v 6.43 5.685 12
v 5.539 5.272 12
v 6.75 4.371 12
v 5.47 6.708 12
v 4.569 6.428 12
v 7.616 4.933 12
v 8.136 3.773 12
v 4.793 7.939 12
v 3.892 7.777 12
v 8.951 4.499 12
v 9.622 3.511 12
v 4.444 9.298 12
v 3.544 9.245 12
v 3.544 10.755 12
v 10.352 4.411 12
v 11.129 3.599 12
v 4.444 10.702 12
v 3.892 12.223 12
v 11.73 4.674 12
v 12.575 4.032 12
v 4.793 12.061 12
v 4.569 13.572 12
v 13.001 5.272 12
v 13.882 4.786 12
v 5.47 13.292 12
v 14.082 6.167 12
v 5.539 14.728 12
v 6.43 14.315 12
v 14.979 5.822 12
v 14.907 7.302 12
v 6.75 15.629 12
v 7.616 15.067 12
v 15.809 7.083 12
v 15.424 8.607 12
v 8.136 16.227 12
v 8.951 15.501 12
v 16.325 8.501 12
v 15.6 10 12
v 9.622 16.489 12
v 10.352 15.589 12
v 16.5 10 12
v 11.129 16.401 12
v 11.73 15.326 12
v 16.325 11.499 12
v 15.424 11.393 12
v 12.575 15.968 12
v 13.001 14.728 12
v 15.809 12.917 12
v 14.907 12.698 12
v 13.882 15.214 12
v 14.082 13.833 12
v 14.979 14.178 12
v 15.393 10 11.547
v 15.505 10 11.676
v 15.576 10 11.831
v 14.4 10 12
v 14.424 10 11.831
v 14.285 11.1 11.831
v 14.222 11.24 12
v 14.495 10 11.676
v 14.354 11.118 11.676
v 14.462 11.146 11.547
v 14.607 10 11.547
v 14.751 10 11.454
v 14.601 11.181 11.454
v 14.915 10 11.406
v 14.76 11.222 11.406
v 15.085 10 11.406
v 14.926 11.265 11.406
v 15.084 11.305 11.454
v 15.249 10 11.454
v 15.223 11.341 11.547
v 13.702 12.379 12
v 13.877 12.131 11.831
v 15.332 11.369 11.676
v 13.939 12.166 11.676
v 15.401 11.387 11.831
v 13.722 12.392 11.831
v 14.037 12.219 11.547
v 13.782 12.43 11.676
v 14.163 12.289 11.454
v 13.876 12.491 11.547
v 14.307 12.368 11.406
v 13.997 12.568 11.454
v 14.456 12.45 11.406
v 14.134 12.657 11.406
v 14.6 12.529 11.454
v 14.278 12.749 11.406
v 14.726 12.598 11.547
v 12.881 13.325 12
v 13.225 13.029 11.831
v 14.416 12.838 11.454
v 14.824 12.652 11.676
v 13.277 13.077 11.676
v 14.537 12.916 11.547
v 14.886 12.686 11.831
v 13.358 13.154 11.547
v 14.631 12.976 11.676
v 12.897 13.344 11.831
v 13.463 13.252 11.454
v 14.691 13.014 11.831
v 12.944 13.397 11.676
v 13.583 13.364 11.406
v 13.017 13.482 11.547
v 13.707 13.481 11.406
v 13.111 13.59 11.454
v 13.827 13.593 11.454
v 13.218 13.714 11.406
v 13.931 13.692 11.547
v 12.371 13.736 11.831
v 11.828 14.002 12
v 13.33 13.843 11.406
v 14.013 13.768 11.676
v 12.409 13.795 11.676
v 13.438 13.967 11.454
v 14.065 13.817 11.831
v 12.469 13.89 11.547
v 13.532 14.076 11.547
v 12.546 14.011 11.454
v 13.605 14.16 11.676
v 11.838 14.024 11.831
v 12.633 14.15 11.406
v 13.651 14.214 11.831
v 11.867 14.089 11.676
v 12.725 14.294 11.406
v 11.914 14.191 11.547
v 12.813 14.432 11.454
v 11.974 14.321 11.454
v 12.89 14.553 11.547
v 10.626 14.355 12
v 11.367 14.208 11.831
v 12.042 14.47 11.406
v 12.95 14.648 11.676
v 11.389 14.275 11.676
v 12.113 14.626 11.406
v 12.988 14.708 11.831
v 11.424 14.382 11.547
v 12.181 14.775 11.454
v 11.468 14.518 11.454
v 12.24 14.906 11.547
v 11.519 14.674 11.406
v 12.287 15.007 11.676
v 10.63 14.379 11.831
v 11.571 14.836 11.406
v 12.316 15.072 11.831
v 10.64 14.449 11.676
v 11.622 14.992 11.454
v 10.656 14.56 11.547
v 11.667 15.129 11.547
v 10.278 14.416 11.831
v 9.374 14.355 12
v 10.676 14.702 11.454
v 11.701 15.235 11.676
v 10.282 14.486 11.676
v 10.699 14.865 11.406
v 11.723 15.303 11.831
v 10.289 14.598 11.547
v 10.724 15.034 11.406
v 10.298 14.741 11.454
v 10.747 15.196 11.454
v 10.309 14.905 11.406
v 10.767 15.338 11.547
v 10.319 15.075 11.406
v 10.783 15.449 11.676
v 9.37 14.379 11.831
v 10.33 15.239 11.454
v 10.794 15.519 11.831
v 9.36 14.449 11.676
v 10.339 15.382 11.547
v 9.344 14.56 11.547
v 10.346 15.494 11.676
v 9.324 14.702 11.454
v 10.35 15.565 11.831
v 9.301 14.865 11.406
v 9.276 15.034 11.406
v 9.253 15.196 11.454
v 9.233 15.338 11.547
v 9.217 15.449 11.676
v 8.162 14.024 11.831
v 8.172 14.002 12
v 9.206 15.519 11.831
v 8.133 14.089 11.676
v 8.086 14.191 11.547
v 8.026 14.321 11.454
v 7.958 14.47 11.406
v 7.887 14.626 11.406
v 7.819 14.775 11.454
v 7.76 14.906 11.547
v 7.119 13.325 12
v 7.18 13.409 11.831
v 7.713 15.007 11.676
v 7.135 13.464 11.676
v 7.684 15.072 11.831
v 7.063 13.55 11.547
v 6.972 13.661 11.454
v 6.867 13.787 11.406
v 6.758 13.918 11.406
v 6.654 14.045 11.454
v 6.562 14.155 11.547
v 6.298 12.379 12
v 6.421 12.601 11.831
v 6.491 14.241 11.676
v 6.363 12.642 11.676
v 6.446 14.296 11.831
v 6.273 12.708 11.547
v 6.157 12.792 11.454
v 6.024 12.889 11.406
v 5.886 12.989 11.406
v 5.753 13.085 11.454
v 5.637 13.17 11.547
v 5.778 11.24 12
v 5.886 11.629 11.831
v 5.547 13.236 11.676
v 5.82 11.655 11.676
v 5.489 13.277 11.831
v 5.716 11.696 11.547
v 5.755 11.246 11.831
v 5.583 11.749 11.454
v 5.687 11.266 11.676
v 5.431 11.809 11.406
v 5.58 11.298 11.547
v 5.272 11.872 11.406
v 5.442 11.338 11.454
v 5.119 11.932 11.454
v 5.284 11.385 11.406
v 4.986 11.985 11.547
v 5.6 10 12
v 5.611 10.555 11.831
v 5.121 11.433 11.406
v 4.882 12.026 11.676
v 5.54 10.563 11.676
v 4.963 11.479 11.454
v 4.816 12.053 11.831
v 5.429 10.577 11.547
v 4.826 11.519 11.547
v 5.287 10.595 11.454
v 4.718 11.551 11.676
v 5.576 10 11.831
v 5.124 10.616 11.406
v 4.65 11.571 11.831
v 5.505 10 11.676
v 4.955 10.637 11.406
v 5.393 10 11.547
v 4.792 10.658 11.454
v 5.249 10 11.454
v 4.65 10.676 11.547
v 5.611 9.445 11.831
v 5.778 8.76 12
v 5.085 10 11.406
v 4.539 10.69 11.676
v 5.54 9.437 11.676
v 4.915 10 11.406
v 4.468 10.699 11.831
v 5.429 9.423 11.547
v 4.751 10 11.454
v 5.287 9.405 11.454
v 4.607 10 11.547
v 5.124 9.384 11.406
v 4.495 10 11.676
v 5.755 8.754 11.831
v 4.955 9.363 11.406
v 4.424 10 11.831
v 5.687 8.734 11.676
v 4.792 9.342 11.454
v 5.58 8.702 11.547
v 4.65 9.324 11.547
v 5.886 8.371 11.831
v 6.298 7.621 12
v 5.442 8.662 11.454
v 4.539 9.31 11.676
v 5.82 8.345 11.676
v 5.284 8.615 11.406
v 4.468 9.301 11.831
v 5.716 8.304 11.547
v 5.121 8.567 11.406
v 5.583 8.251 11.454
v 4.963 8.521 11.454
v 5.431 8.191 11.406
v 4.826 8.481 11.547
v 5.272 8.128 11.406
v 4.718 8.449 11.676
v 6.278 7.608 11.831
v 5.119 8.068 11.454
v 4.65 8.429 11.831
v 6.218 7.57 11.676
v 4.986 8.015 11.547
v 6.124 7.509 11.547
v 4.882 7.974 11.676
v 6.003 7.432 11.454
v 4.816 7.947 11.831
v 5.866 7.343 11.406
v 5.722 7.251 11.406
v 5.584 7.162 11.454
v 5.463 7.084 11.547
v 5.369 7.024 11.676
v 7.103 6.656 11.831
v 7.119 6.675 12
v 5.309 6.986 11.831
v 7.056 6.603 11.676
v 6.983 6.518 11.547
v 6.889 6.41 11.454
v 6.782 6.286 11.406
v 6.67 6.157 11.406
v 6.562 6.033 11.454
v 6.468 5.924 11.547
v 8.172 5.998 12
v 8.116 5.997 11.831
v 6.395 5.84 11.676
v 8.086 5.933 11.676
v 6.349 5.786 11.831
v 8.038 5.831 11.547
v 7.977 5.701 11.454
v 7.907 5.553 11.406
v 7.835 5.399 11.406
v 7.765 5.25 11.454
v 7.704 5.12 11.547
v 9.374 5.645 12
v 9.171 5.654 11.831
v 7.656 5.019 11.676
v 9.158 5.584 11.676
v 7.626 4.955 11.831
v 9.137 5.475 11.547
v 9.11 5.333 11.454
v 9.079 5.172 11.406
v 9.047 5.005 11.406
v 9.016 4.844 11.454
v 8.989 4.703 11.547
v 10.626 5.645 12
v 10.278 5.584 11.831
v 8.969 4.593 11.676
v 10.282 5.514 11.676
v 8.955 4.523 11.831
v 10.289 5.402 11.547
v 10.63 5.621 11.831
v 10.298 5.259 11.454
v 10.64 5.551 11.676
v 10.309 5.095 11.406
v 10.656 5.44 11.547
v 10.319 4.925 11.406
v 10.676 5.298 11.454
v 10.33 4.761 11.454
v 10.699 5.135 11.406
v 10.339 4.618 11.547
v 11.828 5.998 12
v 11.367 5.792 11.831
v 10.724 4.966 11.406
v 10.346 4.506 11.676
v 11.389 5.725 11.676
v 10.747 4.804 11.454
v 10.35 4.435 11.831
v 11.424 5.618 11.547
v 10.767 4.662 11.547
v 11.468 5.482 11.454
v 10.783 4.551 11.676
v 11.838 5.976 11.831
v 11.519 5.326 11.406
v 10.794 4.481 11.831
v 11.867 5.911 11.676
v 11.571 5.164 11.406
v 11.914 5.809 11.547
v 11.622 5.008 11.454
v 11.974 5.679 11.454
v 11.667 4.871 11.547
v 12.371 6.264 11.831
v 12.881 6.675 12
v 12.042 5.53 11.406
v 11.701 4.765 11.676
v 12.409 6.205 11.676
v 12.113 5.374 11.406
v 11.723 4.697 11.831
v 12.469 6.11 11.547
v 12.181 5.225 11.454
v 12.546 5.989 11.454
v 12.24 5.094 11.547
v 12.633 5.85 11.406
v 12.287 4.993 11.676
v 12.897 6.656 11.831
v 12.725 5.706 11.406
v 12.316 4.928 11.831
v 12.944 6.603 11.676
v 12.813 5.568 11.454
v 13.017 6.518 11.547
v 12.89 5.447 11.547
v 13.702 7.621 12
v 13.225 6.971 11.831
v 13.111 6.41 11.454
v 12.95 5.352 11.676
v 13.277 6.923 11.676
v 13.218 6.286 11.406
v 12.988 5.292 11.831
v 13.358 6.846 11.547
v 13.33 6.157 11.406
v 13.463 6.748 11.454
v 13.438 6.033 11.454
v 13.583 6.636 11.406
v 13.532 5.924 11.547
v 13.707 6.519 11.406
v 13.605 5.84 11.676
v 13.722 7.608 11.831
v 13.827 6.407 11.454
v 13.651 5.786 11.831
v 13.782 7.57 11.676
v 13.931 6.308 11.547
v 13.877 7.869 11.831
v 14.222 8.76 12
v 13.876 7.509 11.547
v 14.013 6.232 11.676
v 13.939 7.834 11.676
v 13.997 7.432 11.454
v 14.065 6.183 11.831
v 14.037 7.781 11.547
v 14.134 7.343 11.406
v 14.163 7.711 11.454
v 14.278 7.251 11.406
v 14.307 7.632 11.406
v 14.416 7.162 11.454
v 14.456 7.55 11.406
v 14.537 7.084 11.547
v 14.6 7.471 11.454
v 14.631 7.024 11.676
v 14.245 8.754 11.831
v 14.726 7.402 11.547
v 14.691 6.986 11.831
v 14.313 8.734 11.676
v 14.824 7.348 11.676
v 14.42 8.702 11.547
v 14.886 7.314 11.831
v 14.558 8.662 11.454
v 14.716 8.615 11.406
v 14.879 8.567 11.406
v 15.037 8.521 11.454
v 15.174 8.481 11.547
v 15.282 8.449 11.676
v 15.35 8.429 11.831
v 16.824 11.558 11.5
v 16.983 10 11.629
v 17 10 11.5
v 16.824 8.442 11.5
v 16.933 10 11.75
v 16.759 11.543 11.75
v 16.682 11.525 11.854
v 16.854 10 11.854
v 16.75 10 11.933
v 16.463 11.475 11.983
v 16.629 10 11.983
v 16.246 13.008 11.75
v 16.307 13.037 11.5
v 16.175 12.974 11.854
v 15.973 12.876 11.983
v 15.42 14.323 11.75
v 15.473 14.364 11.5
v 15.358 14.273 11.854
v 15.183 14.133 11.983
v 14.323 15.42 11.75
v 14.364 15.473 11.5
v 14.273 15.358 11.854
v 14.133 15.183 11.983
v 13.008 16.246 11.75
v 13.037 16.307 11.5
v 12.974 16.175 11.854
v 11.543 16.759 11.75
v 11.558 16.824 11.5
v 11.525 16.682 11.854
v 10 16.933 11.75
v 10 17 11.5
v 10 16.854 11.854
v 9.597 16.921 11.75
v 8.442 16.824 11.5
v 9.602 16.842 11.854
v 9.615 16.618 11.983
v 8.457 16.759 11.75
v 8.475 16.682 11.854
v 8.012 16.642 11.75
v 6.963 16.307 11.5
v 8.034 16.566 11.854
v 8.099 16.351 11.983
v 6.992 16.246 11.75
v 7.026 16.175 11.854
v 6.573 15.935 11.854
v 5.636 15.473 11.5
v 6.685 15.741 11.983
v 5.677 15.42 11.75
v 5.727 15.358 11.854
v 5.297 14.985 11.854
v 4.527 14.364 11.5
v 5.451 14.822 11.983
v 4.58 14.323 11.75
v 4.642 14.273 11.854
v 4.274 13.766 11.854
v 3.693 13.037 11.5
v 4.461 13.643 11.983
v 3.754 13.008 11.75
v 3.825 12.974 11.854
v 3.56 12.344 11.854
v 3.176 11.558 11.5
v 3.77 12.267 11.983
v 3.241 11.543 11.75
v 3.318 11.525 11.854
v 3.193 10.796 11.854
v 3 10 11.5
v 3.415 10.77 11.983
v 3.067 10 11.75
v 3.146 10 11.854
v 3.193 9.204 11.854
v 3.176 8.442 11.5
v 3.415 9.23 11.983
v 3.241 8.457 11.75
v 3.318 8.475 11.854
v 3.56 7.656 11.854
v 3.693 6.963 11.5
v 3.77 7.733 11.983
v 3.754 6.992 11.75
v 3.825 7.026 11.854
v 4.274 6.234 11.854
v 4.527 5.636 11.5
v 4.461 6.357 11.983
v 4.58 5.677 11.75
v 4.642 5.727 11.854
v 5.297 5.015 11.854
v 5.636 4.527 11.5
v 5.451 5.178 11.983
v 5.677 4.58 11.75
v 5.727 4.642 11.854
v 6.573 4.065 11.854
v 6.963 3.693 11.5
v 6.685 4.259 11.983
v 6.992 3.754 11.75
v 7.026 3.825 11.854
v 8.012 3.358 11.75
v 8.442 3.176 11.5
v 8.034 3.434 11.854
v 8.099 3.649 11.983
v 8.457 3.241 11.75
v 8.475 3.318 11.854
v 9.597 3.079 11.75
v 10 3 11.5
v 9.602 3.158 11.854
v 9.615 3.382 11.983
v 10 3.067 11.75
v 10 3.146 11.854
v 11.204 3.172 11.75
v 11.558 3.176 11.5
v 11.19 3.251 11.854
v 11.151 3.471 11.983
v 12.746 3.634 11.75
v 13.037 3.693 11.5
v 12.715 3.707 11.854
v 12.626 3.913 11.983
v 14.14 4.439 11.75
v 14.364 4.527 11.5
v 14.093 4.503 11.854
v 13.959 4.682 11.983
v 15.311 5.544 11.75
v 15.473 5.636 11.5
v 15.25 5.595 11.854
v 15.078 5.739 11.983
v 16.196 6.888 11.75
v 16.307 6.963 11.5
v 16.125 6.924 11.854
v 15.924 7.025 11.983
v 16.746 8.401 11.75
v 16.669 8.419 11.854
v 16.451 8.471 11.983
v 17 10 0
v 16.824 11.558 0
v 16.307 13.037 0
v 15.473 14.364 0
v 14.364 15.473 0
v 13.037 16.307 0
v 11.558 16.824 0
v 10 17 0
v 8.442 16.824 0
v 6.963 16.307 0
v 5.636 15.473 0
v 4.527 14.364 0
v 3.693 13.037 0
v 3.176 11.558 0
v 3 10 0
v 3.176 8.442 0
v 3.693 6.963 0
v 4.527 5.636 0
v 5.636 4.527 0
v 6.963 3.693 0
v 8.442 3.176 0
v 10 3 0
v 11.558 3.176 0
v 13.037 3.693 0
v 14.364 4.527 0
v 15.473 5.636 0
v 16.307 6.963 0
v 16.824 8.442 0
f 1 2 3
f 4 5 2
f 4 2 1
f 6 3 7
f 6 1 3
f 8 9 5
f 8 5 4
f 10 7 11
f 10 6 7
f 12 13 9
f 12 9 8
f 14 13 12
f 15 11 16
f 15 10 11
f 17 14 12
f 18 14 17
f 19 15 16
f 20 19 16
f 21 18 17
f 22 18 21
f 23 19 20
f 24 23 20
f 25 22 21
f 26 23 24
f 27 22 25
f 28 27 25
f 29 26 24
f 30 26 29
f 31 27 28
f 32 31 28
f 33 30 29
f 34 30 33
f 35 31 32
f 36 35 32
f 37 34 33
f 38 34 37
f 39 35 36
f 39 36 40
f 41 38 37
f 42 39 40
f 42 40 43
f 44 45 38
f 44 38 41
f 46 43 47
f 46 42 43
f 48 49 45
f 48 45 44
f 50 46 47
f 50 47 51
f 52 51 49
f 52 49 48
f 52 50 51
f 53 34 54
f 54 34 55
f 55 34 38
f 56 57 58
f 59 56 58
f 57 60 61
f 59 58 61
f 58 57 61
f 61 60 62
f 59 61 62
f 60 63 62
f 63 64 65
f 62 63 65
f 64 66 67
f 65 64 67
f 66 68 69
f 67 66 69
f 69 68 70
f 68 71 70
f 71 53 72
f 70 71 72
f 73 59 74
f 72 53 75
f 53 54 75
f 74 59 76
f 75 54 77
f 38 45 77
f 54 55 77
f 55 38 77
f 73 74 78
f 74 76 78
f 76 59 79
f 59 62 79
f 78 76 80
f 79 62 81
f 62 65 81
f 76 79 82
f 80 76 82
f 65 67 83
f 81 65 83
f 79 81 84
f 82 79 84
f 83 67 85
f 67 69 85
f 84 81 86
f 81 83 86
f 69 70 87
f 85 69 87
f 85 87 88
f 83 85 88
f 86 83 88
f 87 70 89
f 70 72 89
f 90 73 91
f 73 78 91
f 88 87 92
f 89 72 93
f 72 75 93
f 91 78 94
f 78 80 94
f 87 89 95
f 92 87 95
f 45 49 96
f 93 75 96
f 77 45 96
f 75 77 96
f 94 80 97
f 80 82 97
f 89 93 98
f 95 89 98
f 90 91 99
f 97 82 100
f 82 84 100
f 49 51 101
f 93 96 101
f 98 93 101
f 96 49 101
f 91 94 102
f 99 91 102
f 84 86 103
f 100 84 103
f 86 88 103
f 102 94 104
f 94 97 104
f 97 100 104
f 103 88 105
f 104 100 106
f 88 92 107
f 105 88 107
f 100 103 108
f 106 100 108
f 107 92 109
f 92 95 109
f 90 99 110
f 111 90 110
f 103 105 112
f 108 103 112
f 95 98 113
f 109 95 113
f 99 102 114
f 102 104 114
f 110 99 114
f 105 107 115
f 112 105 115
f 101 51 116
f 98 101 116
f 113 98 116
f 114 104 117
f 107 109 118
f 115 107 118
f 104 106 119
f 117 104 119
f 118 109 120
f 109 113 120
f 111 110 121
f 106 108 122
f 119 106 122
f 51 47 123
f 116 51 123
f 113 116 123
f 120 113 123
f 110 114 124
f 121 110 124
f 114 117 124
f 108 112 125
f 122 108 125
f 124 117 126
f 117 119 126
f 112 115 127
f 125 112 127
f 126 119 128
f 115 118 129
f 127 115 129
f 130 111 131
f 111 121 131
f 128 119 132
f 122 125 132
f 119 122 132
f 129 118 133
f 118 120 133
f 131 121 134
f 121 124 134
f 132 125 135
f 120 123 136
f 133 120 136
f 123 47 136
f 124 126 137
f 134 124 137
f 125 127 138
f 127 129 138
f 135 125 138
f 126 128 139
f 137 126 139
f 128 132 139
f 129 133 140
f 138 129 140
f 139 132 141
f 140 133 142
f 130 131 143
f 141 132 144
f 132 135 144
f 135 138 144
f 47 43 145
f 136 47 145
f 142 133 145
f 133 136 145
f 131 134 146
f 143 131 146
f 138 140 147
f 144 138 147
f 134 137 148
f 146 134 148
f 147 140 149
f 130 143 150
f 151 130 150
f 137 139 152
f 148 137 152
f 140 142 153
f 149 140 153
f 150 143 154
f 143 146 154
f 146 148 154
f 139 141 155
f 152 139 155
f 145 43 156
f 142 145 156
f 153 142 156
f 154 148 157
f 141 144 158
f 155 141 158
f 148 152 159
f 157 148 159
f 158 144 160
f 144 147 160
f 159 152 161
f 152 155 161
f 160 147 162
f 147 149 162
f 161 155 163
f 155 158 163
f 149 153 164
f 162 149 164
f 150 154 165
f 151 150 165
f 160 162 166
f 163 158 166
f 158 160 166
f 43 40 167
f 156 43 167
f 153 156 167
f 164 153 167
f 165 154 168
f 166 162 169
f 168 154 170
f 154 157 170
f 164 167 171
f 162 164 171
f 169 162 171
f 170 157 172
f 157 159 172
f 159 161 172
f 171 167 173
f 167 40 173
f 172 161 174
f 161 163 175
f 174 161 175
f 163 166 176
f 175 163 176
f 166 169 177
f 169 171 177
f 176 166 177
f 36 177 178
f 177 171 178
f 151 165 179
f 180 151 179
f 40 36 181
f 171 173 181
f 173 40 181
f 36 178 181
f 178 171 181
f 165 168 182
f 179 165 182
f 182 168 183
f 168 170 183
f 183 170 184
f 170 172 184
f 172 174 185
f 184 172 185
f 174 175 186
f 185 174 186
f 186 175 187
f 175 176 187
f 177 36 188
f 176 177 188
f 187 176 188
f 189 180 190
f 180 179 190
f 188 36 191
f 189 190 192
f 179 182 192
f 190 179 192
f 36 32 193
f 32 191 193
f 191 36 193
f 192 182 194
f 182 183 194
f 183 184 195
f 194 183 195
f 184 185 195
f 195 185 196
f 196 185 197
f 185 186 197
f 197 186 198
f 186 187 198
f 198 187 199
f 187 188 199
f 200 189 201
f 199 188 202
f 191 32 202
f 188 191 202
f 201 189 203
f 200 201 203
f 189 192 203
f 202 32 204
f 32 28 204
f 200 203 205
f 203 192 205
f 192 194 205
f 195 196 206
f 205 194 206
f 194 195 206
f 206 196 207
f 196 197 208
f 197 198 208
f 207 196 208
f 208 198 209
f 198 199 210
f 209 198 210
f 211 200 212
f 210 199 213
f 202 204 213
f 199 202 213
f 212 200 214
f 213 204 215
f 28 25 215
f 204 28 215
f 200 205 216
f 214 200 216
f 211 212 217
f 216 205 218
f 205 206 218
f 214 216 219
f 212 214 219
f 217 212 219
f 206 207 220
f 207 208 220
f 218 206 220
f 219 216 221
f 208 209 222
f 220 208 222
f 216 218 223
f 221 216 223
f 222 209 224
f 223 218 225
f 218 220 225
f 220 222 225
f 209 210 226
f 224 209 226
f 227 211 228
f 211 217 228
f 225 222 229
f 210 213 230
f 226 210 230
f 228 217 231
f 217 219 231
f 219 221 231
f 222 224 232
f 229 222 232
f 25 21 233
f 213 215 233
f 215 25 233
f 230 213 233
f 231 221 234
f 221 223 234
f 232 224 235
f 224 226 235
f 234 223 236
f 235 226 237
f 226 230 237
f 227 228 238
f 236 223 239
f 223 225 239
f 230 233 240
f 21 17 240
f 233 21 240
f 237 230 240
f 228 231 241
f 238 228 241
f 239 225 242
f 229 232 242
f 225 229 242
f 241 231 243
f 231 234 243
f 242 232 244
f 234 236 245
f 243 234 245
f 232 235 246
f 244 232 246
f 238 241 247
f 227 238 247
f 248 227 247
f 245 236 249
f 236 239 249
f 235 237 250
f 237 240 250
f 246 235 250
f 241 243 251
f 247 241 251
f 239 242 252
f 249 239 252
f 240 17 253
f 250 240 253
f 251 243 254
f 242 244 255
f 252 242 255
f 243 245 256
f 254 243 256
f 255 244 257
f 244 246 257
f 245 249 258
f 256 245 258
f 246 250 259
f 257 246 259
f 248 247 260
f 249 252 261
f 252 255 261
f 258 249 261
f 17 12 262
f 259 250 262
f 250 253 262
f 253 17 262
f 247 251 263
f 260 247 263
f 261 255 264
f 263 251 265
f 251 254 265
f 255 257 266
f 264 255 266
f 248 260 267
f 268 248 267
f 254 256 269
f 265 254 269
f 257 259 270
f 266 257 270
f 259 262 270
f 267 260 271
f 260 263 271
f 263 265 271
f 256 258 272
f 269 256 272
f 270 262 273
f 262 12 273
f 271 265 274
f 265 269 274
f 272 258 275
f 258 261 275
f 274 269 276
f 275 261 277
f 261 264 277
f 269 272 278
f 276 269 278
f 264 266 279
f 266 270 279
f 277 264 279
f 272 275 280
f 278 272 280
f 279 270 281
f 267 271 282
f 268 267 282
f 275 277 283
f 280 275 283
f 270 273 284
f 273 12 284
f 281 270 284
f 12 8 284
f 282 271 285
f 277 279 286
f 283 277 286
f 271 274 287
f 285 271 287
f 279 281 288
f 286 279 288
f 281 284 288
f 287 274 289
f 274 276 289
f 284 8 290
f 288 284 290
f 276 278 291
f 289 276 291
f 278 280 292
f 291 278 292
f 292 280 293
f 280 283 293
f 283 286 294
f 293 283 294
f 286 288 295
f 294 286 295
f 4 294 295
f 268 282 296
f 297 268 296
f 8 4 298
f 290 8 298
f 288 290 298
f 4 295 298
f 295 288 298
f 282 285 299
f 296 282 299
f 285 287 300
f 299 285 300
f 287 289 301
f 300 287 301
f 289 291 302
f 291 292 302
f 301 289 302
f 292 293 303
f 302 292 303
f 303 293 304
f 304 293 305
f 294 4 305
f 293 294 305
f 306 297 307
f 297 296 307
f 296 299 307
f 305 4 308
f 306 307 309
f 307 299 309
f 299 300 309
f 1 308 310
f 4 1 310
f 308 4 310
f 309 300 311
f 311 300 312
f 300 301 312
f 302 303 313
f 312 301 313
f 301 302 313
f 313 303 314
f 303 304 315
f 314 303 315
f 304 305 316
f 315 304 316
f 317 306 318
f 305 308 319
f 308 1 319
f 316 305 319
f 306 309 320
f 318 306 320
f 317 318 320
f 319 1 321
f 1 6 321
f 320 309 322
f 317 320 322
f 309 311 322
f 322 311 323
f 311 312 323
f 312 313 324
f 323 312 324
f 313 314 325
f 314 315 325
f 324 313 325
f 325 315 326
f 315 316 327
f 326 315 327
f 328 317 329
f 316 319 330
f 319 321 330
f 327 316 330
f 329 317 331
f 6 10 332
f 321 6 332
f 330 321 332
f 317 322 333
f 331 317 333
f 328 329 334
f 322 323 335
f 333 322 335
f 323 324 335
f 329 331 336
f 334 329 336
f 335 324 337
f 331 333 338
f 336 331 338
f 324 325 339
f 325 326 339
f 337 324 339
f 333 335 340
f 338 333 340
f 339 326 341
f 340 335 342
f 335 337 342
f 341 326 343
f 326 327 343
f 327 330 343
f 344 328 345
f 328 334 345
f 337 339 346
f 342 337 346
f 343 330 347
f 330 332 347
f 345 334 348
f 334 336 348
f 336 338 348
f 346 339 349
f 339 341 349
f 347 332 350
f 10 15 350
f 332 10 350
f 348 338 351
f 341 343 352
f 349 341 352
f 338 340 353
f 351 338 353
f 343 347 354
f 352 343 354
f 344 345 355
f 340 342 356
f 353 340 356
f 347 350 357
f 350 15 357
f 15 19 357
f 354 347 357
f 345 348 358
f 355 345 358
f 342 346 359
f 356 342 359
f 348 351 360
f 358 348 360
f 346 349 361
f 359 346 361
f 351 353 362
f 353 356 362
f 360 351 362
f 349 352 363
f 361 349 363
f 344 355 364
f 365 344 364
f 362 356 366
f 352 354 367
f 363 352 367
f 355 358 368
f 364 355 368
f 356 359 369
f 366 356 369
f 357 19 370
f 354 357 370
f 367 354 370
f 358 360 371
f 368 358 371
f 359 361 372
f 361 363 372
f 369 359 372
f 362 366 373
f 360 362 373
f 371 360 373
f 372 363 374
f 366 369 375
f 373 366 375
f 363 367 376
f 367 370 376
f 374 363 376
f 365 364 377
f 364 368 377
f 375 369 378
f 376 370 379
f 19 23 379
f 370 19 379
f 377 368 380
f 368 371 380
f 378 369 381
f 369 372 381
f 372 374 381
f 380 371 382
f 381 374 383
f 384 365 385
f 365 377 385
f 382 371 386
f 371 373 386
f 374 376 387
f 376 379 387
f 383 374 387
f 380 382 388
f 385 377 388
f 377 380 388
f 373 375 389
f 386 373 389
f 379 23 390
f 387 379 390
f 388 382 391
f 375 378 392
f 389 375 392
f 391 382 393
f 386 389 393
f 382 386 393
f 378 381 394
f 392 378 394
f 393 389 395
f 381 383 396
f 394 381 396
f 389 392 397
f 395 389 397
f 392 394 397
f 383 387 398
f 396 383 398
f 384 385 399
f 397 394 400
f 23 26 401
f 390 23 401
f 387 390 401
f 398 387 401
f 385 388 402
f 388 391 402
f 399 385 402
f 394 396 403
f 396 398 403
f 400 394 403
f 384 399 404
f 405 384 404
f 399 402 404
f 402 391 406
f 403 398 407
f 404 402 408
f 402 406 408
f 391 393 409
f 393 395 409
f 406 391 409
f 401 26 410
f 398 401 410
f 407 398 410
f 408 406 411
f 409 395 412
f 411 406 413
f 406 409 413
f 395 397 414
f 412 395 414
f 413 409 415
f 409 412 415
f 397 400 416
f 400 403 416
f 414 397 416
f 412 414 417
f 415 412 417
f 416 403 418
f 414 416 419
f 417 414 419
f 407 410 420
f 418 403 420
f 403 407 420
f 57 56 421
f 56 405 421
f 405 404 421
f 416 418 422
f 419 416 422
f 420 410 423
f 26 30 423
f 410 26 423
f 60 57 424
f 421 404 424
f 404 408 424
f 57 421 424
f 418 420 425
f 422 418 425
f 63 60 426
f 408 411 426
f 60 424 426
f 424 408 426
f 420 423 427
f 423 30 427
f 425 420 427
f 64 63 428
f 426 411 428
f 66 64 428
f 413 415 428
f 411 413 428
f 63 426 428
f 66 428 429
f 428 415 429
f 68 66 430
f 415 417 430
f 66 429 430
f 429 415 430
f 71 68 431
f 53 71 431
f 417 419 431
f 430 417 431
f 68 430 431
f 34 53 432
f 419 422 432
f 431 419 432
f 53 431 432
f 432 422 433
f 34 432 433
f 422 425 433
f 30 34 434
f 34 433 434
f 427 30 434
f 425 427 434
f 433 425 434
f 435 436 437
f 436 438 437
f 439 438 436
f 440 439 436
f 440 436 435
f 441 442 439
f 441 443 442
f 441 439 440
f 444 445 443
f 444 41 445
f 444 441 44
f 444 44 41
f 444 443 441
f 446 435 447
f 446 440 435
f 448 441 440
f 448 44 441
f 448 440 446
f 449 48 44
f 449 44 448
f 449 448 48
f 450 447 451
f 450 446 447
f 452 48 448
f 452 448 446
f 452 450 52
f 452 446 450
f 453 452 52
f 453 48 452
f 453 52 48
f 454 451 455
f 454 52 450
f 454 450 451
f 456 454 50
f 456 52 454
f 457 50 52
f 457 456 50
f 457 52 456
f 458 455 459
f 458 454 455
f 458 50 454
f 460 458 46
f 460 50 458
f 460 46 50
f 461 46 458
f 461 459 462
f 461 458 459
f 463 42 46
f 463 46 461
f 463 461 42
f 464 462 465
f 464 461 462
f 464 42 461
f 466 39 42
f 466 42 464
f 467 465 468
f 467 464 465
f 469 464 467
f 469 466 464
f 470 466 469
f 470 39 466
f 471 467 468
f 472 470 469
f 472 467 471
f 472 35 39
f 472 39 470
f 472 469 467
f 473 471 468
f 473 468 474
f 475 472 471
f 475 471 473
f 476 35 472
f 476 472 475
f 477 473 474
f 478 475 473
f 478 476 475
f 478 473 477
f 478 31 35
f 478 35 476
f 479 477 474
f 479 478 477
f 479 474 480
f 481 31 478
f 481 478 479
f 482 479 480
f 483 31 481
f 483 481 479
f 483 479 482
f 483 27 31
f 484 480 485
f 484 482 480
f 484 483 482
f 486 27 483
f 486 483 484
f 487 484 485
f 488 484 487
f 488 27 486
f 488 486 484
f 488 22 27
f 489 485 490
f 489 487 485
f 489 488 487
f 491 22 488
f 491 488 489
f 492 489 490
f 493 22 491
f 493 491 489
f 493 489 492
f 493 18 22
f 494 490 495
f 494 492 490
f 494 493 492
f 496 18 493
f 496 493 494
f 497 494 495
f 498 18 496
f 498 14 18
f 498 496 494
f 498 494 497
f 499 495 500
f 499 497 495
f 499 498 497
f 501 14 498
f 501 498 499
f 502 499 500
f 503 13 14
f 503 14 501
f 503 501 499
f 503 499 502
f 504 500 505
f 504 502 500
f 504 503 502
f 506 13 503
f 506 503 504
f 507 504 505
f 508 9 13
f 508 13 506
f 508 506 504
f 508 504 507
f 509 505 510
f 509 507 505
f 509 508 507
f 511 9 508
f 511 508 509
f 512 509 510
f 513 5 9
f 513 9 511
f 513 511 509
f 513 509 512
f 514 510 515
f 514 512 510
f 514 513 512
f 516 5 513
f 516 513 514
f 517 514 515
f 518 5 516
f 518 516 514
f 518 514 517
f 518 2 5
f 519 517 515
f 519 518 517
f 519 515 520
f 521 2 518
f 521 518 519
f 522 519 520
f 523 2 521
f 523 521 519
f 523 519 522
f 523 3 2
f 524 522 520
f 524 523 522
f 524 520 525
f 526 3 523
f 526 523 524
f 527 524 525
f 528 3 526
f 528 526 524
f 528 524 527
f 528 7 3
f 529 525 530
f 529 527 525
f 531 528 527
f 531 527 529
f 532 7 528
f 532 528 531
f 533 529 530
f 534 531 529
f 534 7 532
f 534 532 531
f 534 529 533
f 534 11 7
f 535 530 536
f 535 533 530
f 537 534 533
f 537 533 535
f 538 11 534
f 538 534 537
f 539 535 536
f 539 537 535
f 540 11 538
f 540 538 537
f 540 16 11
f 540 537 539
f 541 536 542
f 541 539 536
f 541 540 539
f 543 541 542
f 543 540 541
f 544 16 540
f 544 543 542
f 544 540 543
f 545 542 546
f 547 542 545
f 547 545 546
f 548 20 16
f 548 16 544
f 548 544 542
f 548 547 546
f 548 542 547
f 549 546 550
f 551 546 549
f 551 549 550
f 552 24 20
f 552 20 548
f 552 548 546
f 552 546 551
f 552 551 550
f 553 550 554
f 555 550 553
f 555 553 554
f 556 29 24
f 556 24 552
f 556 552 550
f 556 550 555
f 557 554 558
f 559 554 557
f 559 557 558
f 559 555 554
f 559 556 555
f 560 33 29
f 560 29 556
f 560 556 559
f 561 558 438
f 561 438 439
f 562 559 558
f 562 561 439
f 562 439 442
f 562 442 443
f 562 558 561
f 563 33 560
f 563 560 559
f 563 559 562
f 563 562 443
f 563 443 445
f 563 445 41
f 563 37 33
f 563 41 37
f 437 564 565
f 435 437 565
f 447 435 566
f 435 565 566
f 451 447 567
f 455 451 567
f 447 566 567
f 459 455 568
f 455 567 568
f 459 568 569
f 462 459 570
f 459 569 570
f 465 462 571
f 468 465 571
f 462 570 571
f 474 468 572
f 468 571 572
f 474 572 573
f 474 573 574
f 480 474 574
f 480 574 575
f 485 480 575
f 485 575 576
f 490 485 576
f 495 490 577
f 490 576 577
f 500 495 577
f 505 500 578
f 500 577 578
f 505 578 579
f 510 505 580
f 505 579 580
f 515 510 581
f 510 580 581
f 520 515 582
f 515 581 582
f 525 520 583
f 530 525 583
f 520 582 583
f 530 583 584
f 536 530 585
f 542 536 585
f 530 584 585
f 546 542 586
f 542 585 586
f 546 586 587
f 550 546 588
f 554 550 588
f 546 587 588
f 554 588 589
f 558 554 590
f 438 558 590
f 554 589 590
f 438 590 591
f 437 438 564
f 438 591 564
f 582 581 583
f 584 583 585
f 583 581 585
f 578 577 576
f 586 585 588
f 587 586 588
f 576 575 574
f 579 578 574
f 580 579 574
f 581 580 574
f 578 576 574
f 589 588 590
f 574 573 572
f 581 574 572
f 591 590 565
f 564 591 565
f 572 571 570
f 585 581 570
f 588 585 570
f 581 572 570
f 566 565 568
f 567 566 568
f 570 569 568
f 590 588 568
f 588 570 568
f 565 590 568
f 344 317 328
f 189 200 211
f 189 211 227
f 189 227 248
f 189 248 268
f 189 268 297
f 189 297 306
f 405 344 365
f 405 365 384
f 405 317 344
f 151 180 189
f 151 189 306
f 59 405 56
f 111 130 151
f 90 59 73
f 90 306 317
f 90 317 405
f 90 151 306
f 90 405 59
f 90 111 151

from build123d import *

# Parameters (mm, degrees)
TORUS_R        = 0.6
CYLINDER_R     = 7
CYLINDER_DEPTH = 12
FILLET001_R    = 0.5


with BuildPart() as torus:
    # Torus → Torus (revolve)
    with BuildSketch(Plane(origin=(10, 10, 12), x_dir=(1, 0, 0), z_dir=(0, -1, 0))):
        with Locations((5, 0)):
            Circle(TORUS_R)
    revolve(axis=Axis((10, 10, 12), (0, 0, 1)))


with BuildPart() as cut001:
    # Cylinder → Cylinder (new body)
    with BuildSketch(Plane(origin=(10, 10, 0), x_dir=(1, 0, 0), z_dir=(0, 0, 1))):
        Circle(CYLINDER_R)
    extrude(amount=CYLINDER_DEPTH)

    # Fillet001
    fillet001_edges = [cut001.edges().sort_by_distance(p)[0] for p in [
        (3, 10, 12),
    ]]
    fillet(fillet001_edges, radius=FILLET001_R)

    # Cut001: cut Torus
    add(torus.part, mode=Mode.SUBTRACT)


solid = cut001.part
